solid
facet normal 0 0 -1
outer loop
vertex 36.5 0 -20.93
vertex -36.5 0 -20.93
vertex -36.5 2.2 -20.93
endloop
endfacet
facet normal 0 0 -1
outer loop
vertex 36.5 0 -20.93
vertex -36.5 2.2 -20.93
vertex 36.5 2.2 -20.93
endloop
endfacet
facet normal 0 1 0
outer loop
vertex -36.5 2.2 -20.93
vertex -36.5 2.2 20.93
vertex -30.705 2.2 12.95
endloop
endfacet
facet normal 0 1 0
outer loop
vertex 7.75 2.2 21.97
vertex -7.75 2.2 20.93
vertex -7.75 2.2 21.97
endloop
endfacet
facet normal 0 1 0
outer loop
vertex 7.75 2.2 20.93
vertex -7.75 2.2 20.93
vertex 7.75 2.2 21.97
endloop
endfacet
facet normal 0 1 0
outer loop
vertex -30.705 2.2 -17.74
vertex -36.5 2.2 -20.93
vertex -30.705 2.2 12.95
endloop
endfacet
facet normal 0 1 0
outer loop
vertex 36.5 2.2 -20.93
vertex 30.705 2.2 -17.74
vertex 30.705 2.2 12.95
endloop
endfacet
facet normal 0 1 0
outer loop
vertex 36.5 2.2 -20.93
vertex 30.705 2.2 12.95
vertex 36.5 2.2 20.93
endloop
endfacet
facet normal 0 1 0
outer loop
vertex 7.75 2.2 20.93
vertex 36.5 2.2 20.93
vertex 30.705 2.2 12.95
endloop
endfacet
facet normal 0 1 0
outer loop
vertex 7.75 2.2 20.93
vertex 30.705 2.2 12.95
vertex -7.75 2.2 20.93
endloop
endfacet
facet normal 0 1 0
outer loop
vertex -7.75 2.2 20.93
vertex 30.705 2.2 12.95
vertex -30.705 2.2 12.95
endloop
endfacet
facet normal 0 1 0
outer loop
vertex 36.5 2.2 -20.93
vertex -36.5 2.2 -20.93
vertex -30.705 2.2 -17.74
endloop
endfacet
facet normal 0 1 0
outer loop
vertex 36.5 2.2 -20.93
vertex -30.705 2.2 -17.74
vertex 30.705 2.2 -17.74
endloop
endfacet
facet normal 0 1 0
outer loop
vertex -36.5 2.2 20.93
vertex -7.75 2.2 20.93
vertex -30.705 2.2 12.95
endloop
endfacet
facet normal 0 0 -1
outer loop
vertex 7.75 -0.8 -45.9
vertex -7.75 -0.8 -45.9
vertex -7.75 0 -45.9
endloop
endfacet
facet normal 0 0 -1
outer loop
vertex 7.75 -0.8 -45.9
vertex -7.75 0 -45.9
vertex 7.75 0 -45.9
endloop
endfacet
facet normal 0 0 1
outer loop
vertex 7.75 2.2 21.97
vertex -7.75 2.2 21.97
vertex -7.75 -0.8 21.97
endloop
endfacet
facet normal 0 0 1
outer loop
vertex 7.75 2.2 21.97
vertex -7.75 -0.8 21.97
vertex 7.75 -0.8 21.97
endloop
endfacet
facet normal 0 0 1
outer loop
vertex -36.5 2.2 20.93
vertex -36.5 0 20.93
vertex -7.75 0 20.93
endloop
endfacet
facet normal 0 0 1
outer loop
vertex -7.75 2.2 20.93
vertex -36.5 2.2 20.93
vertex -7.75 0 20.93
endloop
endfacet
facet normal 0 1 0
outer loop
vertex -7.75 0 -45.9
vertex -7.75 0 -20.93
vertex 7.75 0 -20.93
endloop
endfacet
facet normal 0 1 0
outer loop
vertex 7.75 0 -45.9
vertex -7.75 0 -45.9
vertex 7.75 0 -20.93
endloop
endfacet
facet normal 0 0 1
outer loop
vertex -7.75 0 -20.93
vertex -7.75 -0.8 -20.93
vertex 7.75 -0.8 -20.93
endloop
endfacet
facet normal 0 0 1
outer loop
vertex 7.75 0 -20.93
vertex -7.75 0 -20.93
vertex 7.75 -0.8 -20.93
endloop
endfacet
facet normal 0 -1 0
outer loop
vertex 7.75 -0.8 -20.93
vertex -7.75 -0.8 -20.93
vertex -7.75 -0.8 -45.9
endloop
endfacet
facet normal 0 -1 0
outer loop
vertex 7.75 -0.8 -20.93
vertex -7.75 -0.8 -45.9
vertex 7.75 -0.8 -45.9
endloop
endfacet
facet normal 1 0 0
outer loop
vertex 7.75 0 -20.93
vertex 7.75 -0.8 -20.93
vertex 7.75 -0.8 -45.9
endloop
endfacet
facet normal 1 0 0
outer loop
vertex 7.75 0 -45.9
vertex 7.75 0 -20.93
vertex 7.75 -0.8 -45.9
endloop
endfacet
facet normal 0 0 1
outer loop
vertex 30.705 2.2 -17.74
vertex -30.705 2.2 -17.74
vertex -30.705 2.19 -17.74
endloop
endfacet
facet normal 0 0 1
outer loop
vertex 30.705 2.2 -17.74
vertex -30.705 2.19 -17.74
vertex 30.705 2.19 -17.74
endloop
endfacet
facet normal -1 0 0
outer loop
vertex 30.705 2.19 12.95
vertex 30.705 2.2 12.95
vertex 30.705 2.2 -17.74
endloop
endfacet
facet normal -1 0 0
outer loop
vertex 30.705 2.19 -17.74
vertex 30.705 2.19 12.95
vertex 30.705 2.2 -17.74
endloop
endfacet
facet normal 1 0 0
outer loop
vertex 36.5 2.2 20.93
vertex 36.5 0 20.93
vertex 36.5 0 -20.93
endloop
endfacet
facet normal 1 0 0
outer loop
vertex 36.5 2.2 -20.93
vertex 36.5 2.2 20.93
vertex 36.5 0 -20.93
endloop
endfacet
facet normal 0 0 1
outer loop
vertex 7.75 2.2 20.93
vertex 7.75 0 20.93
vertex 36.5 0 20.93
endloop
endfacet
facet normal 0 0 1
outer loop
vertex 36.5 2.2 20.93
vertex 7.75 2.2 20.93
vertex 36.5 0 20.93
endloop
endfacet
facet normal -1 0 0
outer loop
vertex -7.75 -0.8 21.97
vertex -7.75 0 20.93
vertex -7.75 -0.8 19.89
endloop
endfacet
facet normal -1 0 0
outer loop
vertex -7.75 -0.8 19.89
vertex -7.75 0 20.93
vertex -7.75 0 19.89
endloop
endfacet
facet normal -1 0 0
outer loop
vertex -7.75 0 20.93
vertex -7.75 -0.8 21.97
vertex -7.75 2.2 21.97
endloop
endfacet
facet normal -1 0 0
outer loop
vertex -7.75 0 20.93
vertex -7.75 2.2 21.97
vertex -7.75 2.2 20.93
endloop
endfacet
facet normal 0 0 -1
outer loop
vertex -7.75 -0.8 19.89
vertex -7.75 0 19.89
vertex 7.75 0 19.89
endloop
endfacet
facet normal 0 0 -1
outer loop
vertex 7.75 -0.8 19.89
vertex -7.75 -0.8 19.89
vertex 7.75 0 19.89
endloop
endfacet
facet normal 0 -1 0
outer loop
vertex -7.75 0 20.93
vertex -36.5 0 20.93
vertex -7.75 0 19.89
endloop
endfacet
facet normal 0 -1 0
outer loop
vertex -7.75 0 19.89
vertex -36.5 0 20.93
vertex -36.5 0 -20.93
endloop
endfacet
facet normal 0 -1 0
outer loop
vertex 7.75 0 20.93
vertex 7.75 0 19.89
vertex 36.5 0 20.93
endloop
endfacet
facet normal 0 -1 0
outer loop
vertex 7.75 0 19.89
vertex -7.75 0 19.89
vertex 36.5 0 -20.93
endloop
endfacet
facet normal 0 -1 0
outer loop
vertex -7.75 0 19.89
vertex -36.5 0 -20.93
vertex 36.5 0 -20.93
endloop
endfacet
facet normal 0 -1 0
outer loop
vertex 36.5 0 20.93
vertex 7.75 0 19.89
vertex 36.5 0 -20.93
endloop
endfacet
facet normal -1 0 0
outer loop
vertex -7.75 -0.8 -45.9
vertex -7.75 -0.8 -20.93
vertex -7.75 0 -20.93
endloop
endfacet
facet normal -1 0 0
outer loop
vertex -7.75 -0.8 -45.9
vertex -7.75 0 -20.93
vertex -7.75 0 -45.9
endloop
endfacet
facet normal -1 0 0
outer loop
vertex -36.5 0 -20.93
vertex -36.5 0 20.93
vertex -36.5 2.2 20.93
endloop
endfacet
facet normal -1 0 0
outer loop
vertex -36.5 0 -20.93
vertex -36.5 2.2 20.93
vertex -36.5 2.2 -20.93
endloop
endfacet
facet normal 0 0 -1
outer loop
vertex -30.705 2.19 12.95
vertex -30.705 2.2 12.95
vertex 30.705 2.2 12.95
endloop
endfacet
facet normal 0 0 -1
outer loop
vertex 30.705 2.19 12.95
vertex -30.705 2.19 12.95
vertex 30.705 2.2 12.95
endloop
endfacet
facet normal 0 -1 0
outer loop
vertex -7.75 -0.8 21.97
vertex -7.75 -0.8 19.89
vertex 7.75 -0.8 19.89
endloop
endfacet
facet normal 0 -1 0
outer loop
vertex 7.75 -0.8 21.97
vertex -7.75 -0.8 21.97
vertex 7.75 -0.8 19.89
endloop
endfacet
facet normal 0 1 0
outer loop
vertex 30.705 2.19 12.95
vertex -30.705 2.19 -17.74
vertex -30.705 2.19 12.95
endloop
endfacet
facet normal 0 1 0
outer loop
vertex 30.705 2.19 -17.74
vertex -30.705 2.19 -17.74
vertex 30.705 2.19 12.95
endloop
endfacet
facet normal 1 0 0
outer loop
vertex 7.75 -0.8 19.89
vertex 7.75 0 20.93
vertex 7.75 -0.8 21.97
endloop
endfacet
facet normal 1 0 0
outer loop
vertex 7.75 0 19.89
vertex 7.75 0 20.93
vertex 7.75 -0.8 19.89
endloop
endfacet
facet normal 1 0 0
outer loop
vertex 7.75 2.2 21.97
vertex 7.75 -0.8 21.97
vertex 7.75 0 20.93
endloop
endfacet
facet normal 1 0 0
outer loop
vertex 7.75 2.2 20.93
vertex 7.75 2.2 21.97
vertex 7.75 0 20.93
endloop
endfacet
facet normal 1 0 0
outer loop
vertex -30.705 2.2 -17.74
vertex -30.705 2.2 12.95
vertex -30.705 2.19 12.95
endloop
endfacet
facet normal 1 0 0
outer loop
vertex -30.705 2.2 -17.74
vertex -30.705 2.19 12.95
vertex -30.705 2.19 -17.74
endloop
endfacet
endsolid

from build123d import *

# Parameters (mm, degrees)
SKETCH_1_W          = 73
SKETCH_1_H          = 41.86
EXTRUDE_1_DEPTH     = 2.2
SKETCH_2_W          = 61.41
SKETCH_2_H          = 30.69
CUT_EXTRUDE_1_DEPTH = 0.01
SKETCH_3_W          = 15.5
SKETCH_3_H          = 2.08
EXTRUDE_2_DEPTH     = 3
EXTRUDE_START       = -3
SKETCH_3_3_W        = 15.5
SKETCH_3_3_H        = 24.97
SKETCH_3_3_H_2      = 2.08
EXTRUDE_3_DEPTH     = 0.8


with BuildPart() as part:
    # 草图1 → 凸台-拉伸1 (new body)
    with BuildSketch(Plane(origin=(0, 0, 0), x_dir=(1, 0, 0), z_dir=(0, 1, 0))):
        Rectangle(SKETCH_1_W, SKETCH_1_H)
    extrude(amount=EXTRUDE_1_DEPTH)

    # 草图2 → 切除-拉伸1 (cut)
    with BuildSketch(Plane(origin=(0, 2.2, 0), x_dir=(1, 0, 0), z_dir=(0, 1, 0))):
        with Locations((0, 2.395)):
            Rectangle(SKETCH_2_W, SKETCH_2_H)
    extrude(amount=-CUT_EXTRUDE_1_DEPTH, mode=Mode.SUBTRACT)

    # 草图3 → 凸台-拉伸2 (add)
    with BuildSketch(Plane(origin=(0, 2.2, 0), x_dir=(1, 0, 0), z_dir=(0, 1, 0))):
        with Locations((0, -20.93)):
            Rectangle(SKETCH_3_W, SKETCH_3_H)
    extrude(amount=-EXTRUDE_2_DEPTH)

    # 草图3<3> → 凸台-拉伸3 (add)
    with BuildSketch(Plane(origin=(0, 2.2, 0), x_dir=(1, 0, 0), z_dir=(0, 1, 0)).offset(EXTRUDE_START)):
        with Locations((0, 33.415)):
            Rectangle(SKETCH_3_3_W, SKETCH_3_3_H)
        with Locations((0, -20.93)):
            Rectangle(SKETCH_3_3_W, SKETCH_3_3_H_2)
    extrude(amount=EXTRUDE_3_DEPTH)


with BuildPart() as extrude_3_piece_1:
    # of the separate pieces the step leaves, piece 1, a body of its own (extrude_3_pieces)
    add(part.part.solids().sort_by_distance((-36.5, 0, 20.93))[0])


with BuildPart() as extrude_3_piece_2:
    # of the separate pieces the step leaves, piece 2, a body of its own (extrude_3_pieces)
    add(part.part.solids().sort_by_distance((-7.75, -0.8, -20.93))[0])


solid = Compound([extrude_3_piece_1.part, extrude_3_piece_2.part])
